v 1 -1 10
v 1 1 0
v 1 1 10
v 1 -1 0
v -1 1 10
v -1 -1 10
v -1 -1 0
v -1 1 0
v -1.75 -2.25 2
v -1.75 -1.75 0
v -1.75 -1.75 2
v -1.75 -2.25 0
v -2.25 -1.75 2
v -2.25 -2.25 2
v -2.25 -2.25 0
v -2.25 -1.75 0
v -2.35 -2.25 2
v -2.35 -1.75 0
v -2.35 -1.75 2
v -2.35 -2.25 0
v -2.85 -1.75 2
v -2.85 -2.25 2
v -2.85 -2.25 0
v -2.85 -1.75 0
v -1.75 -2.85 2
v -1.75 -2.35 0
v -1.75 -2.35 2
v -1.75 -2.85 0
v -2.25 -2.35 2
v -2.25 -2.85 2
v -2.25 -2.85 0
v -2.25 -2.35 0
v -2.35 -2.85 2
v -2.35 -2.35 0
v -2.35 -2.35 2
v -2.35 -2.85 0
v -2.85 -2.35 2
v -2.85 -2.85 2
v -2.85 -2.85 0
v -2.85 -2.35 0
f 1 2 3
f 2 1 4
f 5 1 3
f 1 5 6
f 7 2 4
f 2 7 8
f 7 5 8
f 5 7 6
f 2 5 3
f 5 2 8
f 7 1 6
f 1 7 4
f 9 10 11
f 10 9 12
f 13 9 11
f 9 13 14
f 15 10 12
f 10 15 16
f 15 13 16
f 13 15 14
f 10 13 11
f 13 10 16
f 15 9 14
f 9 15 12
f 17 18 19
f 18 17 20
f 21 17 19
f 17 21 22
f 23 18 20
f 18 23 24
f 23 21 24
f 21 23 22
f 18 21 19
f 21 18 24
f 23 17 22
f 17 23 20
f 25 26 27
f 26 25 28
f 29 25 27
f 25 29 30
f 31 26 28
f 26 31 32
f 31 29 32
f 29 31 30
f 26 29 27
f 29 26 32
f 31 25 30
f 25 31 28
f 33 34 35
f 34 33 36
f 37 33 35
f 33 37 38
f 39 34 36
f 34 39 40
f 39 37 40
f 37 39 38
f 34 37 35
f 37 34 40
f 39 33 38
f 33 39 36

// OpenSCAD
translate([0, 0, 5]) color([0,1,0,0.9]) cube([2, 2, 10], center=true);
translate([-2, -2, 1]) color([1,0,0]) cube([0.5, 0.5, 2], center=true);
translate([-2.6, -2, 1]) color([1,0,0]) cube([0.5, 0.5, 2], center=true);
translate([-2, -2.6, 1]) color([1,0,0]) cube([0.5, 0.5, 2], center=true);
translate([-2.6, -2.6, 1]) color([1,0,0]) cube([0.5, 0.5, 2], center=true);
